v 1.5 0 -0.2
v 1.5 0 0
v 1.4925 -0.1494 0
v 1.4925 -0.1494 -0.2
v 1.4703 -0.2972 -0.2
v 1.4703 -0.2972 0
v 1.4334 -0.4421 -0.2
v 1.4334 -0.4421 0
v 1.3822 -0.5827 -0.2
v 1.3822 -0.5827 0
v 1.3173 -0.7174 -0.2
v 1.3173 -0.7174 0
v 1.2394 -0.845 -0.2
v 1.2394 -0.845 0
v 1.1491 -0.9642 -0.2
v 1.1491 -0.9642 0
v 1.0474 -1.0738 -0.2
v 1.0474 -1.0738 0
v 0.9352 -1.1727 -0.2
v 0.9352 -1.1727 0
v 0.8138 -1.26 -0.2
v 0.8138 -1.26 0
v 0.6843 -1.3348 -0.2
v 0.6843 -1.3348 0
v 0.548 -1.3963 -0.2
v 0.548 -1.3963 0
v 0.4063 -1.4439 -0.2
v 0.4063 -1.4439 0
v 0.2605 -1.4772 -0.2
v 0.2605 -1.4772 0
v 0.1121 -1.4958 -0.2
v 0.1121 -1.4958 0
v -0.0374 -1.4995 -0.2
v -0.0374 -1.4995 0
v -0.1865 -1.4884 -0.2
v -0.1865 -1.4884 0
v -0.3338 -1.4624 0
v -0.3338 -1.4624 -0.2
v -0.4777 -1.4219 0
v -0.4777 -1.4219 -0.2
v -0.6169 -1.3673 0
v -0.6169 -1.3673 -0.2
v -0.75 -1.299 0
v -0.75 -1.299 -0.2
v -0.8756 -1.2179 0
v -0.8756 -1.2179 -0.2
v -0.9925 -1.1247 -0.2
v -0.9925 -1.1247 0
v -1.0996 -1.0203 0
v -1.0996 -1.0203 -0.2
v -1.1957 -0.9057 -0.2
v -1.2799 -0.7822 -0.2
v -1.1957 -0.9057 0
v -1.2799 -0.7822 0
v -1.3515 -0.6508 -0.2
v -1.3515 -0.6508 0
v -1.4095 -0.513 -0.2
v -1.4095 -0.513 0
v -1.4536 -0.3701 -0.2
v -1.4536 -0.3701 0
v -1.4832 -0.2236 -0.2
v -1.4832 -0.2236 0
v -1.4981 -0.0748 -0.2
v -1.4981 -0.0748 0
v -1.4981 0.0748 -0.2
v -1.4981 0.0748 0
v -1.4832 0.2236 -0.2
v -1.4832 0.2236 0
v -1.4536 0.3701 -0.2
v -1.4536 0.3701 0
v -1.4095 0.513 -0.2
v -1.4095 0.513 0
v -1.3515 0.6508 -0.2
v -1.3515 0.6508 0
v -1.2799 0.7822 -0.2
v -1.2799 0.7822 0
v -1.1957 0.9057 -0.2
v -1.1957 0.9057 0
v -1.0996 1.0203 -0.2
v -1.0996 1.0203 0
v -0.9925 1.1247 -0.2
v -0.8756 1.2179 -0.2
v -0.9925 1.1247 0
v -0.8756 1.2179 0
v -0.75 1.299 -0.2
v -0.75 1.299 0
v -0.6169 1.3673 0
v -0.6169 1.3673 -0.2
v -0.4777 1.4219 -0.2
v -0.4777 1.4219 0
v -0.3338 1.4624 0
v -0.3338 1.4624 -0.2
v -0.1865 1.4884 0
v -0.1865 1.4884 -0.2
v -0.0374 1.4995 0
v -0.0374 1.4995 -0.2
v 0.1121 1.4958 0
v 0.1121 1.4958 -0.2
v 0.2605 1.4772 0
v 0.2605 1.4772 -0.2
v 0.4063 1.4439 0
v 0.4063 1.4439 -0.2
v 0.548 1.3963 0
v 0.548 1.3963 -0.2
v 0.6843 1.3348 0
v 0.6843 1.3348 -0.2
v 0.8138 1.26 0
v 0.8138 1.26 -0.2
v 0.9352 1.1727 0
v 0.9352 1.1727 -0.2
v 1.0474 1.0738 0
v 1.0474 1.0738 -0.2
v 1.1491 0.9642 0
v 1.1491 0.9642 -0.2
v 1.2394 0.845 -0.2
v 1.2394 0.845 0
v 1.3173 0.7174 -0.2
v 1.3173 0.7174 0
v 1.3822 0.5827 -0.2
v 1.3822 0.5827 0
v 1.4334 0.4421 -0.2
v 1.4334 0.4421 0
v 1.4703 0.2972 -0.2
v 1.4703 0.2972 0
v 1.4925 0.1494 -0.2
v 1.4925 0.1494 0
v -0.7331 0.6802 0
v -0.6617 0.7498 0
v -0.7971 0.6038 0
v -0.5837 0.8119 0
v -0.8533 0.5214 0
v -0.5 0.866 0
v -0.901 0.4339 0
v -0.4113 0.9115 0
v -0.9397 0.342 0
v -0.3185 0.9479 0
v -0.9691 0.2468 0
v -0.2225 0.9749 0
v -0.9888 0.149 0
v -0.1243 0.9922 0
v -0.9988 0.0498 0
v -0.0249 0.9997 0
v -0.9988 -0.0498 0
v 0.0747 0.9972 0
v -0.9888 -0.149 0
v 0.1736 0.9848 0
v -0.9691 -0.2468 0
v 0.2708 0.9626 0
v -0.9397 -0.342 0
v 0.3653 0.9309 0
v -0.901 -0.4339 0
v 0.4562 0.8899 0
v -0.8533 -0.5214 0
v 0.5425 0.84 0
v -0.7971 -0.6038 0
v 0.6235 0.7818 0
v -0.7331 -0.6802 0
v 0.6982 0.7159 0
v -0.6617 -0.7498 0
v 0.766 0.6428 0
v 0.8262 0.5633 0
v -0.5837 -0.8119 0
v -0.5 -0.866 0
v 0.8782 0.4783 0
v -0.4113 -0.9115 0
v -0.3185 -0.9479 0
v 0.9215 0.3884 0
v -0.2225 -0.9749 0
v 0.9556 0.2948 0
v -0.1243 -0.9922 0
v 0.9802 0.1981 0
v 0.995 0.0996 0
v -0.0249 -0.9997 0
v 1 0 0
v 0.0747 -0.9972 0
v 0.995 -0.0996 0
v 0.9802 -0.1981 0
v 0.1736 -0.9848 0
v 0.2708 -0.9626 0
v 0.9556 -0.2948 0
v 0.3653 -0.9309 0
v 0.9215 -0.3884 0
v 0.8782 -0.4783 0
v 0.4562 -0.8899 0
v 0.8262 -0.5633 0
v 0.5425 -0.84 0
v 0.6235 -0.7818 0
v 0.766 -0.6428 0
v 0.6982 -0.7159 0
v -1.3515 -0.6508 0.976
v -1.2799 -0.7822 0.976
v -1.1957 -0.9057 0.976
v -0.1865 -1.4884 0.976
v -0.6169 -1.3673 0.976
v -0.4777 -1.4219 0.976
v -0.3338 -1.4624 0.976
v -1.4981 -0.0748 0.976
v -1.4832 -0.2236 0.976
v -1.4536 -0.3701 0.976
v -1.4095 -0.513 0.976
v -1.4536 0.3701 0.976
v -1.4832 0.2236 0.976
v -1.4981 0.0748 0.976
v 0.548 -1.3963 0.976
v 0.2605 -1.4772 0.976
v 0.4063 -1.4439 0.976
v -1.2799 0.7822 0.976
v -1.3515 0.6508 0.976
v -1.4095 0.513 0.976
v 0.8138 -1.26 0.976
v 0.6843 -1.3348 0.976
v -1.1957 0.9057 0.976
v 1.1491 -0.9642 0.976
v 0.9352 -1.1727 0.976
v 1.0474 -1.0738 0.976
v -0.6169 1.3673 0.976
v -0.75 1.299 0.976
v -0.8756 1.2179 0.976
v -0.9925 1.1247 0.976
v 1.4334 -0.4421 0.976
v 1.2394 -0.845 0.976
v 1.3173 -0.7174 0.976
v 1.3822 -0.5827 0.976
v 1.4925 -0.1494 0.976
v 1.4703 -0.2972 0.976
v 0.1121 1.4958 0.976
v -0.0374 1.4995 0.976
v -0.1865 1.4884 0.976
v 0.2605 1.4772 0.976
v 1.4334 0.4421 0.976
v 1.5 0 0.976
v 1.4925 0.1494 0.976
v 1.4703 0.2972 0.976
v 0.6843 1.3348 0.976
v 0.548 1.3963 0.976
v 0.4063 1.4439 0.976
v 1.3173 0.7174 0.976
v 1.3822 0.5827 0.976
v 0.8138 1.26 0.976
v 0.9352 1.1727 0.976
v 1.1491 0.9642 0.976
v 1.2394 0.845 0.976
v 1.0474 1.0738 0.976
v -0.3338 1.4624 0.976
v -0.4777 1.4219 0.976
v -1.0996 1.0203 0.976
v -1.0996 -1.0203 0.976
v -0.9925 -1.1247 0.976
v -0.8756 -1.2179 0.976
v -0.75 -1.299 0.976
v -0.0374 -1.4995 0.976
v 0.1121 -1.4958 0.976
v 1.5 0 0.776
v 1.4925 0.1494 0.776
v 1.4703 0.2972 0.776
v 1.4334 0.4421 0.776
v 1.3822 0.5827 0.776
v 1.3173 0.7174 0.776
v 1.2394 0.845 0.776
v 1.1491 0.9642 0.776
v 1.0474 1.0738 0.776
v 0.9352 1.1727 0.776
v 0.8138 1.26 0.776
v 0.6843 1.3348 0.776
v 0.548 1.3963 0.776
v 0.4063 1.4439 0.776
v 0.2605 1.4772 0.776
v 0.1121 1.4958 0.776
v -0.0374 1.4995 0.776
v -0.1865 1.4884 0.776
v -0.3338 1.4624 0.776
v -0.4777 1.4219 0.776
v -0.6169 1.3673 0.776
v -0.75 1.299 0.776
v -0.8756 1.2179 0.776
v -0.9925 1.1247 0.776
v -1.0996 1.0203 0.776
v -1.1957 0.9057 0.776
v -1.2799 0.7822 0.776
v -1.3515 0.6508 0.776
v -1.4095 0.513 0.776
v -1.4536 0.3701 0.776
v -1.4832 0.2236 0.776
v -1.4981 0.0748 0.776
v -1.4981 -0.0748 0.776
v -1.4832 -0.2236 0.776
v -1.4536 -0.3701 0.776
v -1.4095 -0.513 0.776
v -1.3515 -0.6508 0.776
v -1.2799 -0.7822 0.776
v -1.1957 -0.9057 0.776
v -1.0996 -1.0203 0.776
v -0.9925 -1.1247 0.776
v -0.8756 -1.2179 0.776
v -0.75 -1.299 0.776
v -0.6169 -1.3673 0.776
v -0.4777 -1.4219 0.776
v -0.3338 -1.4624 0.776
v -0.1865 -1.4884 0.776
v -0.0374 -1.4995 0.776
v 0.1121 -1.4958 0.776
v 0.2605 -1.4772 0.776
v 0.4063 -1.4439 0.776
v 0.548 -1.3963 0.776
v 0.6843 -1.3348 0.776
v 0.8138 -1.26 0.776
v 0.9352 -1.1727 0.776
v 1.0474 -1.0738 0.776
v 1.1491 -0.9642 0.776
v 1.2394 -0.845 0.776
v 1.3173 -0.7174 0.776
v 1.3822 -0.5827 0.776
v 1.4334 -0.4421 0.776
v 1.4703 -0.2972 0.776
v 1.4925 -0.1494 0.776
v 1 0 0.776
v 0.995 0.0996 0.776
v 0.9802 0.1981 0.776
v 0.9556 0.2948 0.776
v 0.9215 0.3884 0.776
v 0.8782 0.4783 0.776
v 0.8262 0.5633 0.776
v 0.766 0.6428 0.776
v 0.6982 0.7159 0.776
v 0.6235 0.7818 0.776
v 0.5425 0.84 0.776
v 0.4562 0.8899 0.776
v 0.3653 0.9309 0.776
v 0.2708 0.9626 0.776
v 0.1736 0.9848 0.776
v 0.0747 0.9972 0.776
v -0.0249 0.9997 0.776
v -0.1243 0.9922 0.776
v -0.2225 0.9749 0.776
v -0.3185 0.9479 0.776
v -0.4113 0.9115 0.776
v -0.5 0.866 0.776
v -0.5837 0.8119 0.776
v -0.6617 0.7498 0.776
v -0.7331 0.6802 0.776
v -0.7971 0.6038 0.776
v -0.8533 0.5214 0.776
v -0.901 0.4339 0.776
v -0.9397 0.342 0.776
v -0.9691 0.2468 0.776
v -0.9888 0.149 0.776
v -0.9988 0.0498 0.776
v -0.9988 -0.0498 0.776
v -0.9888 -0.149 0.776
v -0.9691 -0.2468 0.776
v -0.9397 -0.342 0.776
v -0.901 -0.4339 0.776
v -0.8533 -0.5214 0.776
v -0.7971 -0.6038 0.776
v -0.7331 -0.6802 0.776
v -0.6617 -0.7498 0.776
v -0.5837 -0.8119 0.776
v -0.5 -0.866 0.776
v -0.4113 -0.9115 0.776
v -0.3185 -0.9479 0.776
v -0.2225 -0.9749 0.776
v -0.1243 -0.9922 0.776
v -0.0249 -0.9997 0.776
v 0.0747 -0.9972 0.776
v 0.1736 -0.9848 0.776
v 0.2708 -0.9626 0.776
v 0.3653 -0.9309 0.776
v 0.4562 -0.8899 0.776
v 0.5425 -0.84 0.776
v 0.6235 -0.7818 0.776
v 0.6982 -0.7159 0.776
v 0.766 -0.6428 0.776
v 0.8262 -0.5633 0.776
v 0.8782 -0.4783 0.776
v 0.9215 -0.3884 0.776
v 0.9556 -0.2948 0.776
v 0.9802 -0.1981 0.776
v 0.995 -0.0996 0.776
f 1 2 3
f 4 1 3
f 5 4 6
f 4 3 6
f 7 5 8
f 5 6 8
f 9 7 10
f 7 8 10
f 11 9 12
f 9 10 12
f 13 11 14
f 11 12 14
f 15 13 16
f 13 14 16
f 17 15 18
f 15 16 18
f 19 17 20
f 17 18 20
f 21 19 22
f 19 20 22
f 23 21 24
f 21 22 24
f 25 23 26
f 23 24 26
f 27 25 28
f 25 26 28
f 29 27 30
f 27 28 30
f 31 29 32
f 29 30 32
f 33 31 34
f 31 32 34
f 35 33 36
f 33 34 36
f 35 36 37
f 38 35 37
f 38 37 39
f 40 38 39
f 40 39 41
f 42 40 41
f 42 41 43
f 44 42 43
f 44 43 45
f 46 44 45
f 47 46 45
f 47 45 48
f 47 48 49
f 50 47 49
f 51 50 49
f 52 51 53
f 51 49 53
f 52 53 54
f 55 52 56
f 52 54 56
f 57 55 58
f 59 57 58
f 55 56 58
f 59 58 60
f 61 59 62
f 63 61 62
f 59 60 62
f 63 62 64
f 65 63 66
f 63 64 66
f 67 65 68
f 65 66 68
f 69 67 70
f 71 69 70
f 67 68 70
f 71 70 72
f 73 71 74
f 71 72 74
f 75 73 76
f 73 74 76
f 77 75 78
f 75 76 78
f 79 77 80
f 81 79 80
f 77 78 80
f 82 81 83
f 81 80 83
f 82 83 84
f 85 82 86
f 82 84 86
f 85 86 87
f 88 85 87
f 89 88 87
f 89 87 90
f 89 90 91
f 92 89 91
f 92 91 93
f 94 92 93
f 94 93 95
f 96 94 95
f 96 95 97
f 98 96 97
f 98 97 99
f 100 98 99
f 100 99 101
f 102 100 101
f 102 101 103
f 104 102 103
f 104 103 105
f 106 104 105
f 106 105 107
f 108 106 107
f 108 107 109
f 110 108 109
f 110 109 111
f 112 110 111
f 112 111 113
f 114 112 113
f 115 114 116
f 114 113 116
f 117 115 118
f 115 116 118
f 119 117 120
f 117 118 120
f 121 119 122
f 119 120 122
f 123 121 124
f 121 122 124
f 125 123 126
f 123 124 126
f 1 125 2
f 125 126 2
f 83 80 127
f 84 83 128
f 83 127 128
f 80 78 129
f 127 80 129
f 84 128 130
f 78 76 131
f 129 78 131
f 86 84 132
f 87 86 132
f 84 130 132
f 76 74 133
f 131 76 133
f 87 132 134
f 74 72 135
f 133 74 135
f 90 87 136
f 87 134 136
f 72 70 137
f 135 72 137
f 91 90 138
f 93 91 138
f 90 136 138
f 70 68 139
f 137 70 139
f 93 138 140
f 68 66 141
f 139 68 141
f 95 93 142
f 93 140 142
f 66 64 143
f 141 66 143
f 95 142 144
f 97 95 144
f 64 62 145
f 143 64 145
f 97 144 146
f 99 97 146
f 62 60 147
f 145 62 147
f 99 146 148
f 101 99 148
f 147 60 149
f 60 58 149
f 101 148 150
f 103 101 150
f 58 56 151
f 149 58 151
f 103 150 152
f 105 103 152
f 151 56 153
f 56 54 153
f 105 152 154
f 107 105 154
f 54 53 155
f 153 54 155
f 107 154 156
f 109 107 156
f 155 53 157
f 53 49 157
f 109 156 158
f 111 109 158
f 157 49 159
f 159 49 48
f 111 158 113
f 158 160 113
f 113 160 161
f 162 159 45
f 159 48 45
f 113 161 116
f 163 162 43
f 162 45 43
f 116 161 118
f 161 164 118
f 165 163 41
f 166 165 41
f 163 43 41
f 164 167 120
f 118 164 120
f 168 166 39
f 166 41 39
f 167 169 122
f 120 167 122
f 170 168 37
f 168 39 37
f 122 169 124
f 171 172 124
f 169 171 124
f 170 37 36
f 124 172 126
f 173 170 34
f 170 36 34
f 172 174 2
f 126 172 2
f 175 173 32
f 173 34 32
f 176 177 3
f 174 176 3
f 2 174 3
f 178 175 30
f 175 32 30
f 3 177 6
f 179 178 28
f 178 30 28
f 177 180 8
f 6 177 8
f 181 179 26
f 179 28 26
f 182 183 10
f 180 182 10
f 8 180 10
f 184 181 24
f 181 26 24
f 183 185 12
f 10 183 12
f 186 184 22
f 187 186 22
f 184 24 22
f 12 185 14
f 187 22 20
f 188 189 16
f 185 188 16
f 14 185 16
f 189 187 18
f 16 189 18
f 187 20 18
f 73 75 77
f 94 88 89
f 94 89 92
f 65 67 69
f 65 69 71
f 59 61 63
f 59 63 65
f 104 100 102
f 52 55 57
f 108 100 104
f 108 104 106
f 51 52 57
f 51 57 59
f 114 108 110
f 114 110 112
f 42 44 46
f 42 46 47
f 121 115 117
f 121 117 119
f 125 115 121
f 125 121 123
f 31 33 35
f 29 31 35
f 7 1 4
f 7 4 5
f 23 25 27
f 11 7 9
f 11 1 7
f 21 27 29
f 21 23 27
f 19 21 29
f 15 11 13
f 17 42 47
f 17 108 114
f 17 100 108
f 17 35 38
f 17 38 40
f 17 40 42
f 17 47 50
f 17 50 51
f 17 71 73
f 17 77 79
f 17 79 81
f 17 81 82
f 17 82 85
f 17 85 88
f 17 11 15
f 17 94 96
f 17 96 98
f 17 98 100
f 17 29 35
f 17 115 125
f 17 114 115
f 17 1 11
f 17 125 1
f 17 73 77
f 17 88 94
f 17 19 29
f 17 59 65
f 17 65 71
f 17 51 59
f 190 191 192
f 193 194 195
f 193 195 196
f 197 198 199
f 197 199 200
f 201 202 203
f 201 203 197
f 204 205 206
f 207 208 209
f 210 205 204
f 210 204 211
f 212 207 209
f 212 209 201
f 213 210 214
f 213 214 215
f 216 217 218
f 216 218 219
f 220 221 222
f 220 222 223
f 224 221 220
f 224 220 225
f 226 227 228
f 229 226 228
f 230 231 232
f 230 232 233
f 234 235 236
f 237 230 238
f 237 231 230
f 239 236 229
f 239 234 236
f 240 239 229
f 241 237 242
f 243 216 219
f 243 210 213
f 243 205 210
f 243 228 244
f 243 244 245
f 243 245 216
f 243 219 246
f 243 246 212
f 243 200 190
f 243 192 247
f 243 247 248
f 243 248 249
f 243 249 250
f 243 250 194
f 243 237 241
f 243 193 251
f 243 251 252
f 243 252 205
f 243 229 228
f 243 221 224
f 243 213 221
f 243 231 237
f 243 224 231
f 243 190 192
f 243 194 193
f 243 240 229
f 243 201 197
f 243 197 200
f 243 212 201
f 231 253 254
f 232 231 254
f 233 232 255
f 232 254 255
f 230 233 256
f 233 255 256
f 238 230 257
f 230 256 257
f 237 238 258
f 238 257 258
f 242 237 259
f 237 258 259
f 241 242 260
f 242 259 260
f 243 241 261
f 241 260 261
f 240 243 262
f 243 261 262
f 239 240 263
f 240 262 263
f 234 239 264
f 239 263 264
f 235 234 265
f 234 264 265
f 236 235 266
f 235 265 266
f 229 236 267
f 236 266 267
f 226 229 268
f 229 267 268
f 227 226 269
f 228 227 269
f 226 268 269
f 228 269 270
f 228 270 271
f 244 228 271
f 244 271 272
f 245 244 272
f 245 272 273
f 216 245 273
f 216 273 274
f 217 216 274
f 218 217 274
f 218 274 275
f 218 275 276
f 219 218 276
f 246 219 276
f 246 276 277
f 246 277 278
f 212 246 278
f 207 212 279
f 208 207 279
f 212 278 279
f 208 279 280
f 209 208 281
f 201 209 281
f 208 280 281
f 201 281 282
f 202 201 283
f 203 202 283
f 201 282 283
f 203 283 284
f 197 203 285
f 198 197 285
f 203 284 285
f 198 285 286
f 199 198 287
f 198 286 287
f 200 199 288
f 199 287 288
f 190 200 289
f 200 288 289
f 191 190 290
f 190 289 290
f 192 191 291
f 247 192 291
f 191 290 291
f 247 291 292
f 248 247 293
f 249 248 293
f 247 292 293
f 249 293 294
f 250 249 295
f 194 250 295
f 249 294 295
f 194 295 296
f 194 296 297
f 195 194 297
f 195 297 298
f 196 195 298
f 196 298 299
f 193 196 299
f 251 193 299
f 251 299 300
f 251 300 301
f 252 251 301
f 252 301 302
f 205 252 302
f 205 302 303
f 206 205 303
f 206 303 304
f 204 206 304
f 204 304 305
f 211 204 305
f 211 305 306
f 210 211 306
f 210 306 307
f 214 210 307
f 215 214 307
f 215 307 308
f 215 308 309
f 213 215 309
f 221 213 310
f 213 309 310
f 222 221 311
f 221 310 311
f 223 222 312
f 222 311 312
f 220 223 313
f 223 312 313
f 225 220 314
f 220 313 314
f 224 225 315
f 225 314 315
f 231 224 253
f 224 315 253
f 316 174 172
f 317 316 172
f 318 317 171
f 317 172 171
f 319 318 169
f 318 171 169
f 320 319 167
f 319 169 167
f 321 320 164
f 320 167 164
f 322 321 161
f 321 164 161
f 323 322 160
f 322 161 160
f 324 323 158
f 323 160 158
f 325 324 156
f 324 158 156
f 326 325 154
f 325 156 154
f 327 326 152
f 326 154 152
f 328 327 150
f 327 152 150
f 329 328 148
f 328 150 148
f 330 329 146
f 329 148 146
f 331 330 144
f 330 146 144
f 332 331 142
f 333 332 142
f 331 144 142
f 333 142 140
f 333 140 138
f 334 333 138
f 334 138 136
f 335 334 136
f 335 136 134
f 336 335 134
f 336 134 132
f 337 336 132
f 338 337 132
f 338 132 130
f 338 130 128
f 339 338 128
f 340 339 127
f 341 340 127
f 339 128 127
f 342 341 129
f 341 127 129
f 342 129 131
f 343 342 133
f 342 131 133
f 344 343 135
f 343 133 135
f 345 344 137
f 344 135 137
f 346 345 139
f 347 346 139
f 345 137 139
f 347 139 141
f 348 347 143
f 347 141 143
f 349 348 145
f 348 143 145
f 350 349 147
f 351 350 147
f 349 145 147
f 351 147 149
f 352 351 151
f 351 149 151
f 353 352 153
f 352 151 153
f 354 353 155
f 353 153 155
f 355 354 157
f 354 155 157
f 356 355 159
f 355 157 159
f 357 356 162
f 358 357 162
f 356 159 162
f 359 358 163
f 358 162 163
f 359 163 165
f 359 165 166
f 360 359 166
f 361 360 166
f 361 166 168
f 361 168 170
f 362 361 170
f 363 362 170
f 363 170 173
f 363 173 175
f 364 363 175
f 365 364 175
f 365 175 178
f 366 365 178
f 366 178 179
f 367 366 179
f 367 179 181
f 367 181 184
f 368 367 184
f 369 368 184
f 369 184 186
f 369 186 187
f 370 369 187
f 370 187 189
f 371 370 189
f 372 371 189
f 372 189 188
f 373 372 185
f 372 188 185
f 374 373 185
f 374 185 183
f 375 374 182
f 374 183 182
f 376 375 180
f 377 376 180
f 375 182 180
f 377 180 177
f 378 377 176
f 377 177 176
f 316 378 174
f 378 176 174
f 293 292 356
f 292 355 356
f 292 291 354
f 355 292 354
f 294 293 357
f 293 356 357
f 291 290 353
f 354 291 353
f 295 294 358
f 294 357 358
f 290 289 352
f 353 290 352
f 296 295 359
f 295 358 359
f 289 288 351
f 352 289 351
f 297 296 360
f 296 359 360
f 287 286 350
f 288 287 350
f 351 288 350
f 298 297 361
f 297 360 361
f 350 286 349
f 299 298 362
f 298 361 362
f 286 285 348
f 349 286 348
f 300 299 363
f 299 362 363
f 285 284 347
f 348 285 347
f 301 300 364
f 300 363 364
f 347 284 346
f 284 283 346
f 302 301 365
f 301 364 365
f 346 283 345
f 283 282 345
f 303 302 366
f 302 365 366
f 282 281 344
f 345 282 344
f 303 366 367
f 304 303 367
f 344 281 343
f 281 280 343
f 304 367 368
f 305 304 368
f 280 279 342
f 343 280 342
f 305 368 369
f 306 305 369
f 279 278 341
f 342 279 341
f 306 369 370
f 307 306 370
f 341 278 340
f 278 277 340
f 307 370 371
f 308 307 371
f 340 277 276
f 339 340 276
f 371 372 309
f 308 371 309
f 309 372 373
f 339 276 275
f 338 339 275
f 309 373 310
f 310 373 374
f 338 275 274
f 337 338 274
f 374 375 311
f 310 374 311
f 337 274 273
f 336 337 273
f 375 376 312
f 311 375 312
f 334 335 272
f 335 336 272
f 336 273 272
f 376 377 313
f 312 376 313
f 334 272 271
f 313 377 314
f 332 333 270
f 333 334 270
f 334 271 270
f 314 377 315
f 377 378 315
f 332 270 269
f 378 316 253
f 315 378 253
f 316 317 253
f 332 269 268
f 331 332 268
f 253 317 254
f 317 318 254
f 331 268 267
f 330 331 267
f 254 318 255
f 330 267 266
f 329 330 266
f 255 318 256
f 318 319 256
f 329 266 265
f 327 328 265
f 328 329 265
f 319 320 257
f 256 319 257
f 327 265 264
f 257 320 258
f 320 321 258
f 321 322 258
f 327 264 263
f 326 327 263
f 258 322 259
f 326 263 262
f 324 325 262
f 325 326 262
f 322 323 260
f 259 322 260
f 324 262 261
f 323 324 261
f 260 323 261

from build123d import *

# Parameters (mm, degrees)
F0_R     = 1
F1_DEPTH = 0.776
F2_R     = 1.5
F2_R_2   = 1
F3_DEPTH = 0.2
F4_R     = 1.5
F4_R_2   = 1
F5_DEPTH = 0.2


with BuildPart() as f1:
    # F0 (on Top) → F1 (new body)
    with BuildSketch(Plane.XY):
        Circle(F0_R)
    extrude(amount=F1_DEPTH)

    # F2 (on face) → F3 (join)
    with BuildSketch(Plane.XY.offset(0.776)):
        Circle(F2_R)
        Circle(F2_R_2, mode=Mode.SUBTRACT)
        Circle(F2_R_2)
    extrude(amount=F3_DEPTH)

    # F4 (on face) → F5 (join)
    with BuildSketch(Plane(origin=(0, 0, 0), x_dir=(1, 0, 0), z_dir=(0, 0, -1))):
        Circle(F4_R)
        Circle(F4_R_2, mode=Mode.SUBTRACT)
        Circle(F4_R_2)
    extrude(amount=F5_DEPTH)


solid = f1.part
